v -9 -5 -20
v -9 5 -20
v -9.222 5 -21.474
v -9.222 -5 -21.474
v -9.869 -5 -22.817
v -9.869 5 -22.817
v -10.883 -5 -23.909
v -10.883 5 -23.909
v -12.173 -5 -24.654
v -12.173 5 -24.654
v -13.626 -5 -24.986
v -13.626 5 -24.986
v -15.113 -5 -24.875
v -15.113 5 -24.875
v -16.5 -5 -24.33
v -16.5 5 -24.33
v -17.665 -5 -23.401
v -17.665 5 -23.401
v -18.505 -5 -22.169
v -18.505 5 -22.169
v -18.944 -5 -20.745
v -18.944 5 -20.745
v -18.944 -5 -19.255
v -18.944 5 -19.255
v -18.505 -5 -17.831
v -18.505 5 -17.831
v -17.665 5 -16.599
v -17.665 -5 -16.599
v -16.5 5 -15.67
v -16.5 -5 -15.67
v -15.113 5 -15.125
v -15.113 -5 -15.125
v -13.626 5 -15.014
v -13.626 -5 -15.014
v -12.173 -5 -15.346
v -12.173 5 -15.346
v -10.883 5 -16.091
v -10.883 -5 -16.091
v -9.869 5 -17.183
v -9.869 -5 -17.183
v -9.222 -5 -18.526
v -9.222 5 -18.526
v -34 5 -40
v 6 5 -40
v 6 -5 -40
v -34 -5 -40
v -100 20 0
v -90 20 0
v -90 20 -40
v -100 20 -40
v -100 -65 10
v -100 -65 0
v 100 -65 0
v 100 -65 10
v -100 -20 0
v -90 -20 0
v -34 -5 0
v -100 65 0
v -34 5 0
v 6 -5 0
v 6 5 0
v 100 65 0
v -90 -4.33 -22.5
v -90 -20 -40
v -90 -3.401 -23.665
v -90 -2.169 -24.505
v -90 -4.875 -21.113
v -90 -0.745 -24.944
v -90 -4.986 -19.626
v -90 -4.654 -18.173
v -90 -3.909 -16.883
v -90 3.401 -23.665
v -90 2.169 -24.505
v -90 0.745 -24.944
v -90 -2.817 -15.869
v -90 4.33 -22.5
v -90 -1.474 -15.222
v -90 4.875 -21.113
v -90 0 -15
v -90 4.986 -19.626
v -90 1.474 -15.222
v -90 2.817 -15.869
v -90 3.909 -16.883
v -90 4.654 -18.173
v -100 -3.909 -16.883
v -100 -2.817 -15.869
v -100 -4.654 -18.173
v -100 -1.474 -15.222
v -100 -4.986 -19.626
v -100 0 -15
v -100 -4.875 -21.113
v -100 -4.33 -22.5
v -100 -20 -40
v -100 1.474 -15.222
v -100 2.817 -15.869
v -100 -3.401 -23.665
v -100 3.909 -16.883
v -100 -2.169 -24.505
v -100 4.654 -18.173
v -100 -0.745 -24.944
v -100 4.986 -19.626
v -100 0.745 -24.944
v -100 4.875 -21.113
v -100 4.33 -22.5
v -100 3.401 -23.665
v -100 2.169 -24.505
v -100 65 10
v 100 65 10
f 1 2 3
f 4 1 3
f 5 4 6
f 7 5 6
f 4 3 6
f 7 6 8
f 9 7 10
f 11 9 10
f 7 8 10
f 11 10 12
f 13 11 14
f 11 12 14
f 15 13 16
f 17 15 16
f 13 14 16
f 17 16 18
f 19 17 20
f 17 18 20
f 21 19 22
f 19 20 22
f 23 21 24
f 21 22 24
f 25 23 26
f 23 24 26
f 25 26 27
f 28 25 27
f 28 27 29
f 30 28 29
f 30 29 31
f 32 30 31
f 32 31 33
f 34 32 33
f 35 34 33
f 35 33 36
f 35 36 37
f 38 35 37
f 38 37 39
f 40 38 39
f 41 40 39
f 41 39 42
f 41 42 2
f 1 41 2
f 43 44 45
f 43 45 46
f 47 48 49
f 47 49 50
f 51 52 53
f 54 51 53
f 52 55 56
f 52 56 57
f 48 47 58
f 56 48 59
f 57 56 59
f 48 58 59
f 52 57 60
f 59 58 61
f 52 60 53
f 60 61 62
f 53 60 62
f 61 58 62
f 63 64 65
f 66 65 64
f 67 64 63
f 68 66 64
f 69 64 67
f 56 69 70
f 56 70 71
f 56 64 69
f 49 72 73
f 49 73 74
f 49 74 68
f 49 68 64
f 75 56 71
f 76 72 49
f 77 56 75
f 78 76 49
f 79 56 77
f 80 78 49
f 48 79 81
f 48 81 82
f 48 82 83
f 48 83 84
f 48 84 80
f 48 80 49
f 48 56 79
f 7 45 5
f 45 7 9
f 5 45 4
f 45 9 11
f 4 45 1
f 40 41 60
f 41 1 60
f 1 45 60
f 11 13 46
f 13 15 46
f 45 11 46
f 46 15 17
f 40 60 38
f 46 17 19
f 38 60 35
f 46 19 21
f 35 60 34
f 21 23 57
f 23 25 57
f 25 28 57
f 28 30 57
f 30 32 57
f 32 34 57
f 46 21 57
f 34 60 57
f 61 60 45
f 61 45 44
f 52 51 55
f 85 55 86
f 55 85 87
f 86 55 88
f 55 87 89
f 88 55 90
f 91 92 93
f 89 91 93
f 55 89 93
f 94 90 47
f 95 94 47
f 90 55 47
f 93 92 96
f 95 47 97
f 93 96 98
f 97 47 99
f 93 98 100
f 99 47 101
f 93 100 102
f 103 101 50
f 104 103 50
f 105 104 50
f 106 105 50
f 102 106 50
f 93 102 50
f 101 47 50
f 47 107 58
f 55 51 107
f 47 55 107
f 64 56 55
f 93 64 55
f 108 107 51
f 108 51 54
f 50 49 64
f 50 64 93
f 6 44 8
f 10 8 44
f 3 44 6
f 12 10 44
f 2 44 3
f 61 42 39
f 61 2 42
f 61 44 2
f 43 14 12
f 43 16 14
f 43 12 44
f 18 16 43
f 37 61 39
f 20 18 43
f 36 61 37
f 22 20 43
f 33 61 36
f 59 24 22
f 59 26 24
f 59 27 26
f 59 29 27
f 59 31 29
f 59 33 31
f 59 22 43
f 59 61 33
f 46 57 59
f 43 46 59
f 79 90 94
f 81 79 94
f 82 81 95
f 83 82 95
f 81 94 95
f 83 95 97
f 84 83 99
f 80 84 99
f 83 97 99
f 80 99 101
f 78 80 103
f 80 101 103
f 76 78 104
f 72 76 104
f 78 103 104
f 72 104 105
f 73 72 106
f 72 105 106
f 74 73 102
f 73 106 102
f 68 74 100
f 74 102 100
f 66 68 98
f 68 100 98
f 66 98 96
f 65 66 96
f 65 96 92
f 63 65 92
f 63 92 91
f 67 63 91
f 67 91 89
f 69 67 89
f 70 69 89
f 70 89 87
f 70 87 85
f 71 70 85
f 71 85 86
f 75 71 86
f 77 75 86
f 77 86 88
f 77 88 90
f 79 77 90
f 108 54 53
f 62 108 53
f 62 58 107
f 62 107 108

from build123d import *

# Parameters (mm, degrees)
SKETCH1_W           = 200
SKETCH1_H           = 100
BOSS_EXTRUDE1_DEPTH = 10
SKETCH2_W           = 40
SKETCH2_H           = 10
SKETCH2_W_2         = 10
SKETCH2_H_2         = 40
BOSS_EXTRUDE2_DEPTH = 40
SKETCH4_R           = 5
CUT_EXTRUDE2_DEPTH  = 31
SKETCH7_W           = 200
SKETCH7_H           = 10
BOSS_EXTRUDE3_DEPTH = 65
SKETCH9_R           = 5
CUT_EXTRUDE4_DEPTH  = 130


with BuildPart() as part:
    # Sketch1 → Boss-Extrude1 (new body)
    with BuildSketch(Plane.XY):
        Rectangle(SKETCH1_W, SKETCH1_H)
    extrude(amount=BOSS_EXTRUDE1_DEPTH)

    # Sketch2 → Boss-Extrude2 (add)
    with BuildSketch(Plane(origin=(0, 0, 0), x_dir=(-1, 0, 0), z_dir=(0, 0, -1))):
        with Locations((14, 0)):
            Rectangle(SKETCH2_W, SKETCH2_H)
        with Locations((95, 0)):
            Rectangle(SKETCH2_W_2, SKETCH2_H_2)
    extrude(amount=BOSS_EXTRUDE2_DEPTH)

    # Sketch4 → Cut-Extrude2 (cut)
    with BuildSketch(Plane.ZY.offset(100)):
        with Locations((-20, 0)):
            Circle(SKETCH4_R)
    extrude(amount=-CUT_EXTRUDE2_DEPTH, mode=Mode.SUBTRACT)

    # Sketch7 → Boss-Extrude3 (add, symmetric)
    with BuildSketch(Plane(origin=(0, 0, 0), x_dir=(1, 0, 0), z_dir=(0, 1, 0))):
        with Locations((0, -5)):
            Rectangle(SKETCH7_W, SKETCH7_H)
    extrude(amount=BOSS_EXTRUDE3_DEPTH, both=True)

    # Sketch9 → Cut-Extrude4 (cut)
    with BuildSketch(Plane(origin=(0, 5, 0), x_dir=(1, 0, 0), z_dir=(0, 1, 0))):
        with Locations((-14, 20)):
            Circle(SKETCH9_R)
    extrude(amount=-CUT_EXTRUDE4_DEPTH, mode=Mode.SUBTRACT)


solid = part.part
